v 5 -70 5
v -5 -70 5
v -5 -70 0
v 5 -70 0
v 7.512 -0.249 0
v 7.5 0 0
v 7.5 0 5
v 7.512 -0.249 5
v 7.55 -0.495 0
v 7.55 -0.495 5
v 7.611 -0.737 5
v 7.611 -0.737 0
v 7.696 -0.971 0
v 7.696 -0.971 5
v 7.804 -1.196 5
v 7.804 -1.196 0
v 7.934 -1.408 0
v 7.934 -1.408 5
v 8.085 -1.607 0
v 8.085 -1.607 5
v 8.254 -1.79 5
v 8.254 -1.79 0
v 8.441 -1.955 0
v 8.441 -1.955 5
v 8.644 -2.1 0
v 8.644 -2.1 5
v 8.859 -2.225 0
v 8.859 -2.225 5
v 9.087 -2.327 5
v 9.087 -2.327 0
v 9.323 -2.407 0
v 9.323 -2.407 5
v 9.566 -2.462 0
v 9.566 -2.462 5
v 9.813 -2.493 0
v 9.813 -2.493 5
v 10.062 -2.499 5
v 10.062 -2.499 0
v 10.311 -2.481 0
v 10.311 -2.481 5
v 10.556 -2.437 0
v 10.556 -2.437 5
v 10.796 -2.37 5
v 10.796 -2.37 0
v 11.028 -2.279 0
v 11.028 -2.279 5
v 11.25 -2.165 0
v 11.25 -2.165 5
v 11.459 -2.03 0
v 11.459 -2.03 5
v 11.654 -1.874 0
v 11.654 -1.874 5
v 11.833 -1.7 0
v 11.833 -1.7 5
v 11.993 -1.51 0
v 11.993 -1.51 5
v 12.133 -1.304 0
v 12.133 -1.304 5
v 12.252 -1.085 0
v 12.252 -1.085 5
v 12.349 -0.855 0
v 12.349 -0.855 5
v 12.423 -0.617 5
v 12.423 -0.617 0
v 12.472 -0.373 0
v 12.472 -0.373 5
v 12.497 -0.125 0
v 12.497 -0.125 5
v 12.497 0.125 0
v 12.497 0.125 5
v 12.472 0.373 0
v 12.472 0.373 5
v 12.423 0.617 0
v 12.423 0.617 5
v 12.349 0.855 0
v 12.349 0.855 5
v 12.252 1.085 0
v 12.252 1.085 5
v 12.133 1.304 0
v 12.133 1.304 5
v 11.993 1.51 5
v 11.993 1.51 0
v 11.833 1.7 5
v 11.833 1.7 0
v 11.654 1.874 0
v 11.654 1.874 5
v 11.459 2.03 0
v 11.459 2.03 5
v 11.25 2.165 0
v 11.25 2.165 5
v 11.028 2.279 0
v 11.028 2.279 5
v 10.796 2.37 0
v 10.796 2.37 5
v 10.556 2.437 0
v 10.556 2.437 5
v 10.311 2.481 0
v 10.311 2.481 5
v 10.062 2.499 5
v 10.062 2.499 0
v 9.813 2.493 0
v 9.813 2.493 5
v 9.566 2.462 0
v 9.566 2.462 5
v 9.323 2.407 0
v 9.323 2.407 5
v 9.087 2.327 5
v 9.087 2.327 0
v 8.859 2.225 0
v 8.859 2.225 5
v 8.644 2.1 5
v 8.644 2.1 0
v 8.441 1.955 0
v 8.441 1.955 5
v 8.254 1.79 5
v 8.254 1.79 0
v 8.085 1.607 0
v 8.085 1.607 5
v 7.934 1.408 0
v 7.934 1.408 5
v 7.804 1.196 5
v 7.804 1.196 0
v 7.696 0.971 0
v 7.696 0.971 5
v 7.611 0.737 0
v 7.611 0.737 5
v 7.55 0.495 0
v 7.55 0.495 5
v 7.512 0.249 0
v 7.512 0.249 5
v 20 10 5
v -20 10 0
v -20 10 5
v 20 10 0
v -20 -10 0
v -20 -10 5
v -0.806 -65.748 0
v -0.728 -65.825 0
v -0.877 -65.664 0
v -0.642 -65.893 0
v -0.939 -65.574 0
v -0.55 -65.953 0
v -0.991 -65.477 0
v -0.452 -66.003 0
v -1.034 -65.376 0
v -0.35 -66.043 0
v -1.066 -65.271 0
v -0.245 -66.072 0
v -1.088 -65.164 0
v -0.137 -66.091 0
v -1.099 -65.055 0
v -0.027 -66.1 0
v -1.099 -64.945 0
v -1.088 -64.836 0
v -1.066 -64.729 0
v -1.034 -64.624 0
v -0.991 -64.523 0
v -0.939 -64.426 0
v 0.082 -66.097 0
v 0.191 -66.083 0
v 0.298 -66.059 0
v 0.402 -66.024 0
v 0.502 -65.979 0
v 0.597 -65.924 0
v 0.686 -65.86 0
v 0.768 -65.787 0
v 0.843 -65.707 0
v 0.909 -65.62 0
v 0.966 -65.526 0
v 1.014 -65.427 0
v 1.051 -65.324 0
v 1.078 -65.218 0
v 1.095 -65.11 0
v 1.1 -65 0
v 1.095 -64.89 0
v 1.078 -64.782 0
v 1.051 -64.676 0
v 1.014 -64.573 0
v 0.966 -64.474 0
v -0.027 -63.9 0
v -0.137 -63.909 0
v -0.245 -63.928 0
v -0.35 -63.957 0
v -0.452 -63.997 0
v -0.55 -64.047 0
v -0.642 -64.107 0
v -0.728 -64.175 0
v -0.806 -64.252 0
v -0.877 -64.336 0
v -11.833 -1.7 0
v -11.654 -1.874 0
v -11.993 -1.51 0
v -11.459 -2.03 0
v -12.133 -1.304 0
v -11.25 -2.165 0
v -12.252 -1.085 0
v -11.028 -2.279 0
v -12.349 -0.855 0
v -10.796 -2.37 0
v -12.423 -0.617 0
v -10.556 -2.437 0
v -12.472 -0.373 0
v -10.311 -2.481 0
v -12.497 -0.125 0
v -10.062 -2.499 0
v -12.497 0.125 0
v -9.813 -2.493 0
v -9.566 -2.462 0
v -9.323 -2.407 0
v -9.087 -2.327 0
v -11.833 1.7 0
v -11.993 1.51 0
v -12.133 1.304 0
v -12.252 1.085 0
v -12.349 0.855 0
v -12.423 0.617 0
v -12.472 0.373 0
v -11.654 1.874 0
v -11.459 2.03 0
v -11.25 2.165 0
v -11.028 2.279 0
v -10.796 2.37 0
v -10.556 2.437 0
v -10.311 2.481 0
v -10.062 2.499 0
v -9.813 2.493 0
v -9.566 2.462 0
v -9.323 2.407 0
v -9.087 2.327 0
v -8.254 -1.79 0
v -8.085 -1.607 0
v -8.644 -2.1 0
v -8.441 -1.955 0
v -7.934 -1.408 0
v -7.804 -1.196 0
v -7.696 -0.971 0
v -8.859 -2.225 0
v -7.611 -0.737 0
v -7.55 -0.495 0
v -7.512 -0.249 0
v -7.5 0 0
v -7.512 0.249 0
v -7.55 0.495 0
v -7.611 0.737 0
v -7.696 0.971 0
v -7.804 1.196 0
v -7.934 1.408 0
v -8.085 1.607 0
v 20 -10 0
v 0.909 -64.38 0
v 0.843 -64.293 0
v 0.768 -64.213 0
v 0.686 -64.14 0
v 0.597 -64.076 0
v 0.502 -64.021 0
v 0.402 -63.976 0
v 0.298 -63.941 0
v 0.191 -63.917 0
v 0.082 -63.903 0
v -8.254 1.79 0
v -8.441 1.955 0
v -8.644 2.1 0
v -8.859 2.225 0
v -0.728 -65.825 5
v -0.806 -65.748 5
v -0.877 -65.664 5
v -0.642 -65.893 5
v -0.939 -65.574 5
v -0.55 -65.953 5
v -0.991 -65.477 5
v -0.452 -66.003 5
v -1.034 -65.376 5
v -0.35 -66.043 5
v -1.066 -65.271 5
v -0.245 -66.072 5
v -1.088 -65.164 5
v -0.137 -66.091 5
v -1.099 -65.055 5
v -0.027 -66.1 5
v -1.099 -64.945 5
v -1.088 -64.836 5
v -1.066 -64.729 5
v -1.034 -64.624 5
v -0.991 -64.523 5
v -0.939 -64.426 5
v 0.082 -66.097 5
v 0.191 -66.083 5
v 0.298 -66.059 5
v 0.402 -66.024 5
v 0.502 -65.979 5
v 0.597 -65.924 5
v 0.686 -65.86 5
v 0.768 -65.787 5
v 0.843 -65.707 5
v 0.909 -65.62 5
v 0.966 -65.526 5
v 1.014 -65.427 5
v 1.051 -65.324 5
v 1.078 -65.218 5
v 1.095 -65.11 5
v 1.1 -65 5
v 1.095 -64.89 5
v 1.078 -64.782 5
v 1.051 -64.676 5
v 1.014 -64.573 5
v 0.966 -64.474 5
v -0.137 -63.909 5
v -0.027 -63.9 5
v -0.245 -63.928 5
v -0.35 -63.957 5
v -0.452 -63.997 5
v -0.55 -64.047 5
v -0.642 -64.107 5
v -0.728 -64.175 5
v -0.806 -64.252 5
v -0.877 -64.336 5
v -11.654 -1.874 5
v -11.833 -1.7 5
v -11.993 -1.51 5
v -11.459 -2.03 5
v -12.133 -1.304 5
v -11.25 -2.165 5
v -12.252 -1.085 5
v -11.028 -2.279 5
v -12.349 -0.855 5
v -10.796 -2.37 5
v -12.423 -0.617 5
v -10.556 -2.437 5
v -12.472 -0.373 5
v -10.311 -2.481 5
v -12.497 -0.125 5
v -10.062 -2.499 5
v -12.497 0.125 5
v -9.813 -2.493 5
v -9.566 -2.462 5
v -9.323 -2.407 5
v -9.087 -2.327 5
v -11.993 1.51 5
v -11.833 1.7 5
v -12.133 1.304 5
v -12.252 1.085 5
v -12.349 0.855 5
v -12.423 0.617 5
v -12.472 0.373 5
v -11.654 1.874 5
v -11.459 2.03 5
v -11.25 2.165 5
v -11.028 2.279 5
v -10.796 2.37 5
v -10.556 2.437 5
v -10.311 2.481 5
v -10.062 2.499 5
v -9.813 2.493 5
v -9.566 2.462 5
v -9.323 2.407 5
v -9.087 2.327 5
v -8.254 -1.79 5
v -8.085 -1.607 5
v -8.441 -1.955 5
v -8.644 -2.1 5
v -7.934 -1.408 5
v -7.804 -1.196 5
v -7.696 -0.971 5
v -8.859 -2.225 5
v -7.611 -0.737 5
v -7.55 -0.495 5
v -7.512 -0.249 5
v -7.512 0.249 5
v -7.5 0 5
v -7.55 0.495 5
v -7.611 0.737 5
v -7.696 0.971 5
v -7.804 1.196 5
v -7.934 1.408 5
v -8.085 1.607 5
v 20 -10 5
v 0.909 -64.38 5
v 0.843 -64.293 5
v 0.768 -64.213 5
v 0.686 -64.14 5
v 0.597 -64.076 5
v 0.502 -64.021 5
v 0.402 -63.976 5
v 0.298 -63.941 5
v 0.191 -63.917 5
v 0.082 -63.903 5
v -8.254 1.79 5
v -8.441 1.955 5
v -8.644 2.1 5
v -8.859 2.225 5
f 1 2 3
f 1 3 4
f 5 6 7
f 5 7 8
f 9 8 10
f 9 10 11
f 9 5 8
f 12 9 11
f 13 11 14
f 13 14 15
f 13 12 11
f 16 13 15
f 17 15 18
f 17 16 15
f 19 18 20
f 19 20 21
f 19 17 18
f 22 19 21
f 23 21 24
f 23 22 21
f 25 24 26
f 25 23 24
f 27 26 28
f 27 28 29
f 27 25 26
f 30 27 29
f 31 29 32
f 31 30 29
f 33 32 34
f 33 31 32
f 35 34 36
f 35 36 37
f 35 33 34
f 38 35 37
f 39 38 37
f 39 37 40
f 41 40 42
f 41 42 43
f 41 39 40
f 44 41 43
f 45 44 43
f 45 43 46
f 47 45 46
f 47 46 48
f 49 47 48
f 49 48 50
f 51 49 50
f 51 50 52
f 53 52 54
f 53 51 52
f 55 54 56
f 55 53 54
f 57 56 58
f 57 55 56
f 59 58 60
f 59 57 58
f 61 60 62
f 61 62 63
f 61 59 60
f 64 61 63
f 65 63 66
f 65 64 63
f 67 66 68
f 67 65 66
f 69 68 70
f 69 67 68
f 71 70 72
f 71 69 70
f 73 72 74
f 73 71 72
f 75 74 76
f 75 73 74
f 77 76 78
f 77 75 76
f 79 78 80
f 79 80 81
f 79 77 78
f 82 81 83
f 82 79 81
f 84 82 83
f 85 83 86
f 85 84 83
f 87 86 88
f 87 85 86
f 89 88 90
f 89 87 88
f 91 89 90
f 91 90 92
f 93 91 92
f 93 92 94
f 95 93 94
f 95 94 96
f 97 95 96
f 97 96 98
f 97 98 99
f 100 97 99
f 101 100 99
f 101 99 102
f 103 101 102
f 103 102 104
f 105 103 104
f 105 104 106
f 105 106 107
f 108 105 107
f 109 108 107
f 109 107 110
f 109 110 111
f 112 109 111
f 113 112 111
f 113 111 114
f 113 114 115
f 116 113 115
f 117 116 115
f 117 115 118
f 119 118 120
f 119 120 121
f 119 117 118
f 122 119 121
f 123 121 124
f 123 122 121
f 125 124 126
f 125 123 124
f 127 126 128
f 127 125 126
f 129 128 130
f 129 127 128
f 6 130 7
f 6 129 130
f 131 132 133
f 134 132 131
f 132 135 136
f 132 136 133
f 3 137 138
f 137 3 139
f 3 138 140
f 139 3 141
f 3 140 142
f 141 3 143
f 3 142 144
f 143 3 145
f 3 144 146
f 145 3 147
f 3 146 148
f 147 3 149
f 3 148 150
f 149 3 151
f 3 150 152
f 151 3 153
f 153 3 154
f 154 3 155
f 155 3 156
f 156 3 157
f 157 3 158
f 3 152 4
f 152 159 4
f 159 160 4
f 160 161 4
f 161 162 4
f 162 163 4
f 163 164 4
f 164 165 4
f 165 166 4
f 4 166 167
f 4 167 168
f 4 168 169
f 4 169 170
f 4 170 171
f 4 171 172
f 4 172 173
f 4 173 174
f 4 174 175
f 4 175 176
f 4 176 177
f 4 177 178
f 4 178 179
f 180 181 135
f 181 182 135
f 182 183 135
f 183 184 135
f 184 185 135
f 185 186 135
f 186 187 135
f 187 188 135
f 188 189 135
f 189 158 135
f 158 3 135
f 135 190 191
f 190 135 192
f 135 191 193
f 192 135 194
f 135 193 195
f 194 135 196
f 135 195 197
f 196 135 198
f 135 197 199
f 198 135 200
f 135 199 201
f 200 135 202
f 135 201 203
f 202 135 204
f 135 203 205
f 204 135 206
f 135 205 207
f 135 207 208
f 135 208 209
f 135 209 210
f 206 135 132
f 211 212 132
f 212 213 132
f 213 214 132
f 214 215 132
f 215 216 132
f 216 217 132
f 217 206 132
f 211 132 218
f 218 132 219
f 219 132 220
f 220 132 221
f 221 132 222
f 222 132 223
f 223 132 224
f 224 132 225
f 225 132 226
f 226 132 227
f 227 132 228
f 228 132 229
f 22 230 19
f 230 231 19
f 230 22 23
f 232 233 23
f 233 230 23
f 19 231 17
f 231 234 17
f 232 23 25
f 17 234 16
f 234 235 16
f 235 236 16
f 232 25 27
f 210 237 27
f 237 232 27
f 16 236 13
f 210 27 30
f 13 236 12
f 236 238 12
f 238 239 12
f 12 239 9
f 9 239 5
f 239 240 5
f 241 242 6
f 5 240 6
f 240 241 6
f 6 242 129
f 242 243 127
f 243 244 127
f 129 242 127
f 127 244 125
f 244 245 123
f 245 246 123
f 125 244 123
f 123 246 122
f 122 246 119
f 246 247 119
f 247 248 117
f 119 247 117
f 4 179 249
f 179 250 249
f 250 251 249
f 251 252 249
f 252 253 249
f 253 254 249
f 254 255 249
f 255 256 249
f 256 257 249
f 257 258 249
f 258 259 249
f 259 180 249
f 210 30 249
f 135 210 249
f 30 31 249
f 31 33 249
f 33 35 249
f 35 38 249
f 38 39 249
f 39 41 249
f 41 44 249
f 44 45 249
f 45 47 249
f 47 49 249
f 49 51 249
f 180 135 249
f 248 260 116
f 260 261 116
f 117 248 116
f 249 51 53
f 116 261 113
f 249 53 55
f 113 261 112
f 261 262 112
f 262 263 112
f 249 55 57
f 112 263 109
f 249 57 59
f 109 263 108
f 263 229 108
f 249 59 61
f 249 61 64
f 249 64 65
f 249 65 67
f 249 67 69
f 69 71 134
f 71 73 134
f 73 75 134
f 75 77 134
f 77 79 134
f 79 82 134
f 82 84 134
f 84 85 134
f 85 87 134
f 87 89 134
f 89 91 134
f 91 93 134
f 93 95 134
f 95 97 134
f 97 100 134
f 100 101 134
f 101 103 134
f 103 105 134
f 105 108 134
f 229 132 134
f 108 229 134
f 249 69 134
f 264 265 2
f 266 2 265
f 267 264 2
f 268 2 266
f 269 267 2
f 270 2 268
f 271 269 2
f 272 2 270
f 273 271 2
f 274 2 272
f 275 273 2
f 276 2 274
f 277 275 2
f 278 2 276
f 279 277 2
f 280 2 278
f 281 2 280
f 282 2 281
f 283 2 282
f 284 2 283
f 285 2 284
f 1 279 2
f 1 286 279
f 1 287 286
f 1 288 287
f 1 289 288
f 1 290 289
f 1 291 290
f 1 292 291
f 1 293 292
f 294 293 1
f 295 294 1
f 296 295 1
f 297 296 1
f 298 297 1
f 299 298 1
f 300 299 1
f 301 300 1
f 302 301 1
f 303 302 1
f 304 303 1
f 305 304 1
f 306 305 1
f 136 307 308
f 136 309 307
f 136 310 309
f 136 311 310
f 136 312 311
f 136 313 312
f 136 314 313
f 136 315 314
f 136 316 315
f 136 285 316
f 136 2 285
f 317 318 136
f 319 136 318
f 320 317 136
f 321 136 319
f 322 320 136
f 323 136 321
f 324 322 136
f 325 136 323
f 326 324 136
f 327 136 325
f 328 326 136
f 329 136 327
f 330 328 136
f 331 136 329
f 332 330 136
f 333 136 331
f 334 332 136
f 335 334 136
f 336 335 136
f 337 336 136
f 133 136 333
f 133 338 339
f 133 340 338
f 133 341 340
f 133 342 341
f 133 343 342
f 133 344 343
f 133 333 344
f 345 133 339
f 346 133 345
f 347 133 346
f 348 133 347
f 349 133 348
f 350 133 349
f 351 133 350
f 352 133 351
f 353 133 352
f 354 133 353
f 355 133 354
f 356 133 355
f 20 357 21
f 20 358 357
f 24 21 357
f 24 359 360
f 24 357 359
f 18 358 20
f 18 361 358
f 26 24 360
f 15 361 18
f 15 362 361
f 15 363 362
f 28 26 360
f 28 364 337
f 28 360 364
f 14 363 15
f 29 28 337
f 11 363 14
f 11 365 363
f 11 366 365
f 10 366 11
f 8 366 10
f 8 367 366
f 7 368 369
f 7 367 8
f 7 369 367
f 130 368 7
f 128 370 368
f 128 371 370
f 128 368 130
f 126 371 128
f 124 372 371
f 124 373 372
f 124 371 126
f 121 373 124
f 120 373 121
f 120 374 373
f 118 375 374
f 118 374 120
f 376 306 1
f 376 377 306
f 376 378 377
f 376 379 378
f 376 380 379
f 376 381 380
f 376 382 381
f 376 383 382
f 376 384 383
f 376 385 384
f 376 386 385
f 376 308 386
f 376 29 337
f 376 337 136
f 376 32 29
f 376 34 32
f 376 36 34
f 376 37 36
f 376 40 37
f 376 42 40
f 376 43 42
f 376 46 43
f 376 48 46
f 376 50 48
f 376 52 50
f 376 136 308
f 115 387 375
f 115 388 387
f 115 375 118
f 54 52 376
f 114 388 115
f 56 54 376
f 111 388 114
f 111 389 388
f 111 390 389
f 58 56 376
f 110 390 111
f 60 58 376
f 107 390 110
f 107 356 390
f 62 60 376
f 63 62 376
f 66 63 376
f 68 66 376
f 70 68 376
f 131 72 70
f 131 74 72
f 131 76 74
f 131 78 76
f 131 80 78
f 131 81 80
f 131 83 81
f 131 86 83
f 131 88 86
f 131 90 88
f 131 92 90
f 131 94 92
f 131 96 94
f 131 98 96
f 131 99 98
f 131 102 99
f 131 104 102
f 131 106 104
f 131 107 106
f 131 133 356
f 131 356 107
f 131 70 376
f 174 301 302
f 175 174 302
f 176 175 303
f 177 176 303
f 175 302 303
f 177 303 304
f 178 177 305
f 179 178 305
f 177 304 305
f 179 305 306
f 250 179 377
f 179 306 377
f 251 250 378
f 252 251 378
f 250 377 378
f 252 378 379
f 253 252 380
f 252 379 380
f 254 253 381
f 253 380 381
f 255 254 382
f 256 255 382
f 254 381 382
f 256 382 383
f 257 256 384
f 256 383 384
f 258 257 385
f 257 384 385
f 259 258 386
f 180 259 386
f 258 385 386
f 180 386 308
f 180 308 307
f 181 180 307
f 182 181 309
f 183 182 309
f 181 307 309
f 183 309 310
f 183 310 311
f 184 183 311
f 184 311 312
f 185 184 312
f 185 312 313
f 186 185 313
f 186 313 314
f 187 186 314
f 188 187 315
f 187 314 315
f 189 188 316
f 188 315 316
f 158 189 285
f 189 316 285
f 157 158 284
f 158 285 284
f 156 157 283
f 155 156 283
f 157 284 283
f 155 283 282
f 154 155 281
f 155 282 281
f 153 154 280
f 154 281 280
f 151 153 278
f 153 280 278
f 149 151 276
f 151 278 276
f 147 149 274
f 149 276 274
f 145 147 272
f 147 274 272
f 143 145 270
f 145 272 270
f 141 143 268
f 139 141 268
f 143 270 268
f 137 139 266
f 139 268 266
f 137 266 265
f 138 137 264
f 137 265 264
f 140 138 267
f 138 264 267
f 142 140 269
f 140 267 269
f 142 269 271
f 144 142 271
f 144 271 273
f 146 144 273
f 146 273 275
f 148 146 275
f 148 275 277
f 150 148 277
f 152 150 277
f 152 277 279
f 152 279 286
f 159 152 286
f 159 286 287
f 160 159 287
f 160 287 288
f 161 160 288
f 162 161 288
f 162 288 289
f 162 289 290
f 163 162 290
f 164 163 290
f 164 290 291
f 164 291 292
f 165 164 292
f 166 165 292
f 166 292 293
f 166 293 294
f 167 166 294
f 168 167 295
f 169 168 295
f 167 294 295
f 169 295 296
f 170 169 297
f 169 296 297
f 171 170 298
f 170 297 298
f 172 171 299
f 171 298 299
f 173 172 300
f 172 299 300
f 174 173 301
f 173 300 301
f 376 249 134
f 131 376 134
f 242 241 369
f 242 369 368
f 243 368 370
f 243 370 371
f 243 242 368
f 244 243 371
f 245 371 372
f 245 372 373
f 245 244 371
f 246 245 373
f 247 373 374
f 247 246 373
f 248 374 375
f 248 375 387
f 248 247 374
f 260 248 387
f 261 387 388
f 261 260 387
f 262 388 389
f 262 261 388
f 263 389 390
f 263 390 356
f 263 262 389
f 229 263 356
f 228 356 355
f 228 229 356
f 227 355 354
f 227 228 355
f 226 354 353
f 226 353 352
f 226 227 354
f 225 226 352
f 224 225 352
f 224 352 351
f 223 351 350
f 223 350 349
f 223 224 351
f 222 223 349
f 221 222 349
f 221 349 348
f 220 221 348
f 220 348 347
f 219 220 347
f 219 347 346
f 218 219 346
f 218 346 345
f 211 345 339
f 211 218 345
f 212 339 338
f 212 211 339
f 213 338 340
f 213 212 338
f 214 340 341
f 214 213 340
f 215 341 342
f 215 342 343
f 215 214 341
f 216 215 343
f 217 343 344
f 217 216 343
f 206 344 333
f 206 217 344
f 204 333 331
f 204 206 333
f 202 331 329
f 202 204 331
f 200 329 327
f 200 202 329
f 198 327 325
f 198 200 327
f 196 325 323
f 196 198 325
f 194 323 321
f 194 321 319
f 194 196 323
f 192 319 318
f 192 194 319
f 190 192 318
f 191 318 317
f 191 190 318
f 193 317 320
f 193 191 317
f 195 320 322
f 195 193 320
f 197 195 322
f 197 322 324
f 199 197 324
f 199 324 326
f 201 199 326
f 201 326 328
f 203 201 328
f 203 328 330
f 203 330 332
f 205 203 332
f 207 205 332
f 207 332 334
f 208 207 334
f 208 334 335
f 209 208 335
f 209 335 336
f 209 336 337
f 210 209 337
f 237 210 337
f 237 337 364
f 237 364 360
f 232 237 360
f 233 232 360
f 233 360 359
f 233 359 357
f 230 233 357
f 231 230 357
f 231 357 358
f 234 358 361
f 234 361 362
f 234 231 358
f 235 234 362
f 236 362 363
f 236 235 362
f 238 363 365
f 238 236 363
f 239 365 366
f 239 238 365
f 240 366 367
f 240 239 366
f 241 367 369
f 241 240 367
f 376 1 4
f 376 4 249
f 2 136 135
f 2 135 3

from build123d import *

# Parameters (mm, degrees)
CROQUIS1_W              = 40
CROQUIS1_H              = 20
CROQUIS1_R              = 2.5
SALIENTE_EXTRUIR1_DEPTH = 5
CROQUIS2_W              = 10
CROQUIS2_H              = 10
CROQUIS2_R              = 1.1
SALIENTE_EXTRUIR2_DEPTH = 5


with BuildPart() as part:
    # Croquis1 → Saliente-Extruir1 (new body)
    with BuildSketch(Plane.XY):
        Rectangle(CROQUIS1_W, CROQUIS1_H)
        with Locations((-10, 0)):
            Circle(CROQUIS1_R, mode=Mode.SUBTRACT)
        with Locations(Location((10, 0, 0), (0, 0, 180))):
            Circle(CROQUIS1_R, mode=Mode.SUBTRACT)
    extrude(amount=SALIENTE_EXTRUIR1_DEPTH)

    # Croquis2 → Saliente-Extruir2 (add)
    # profile 1 of 2: a face of its own
    with BuildSketch(Plane.XY.offset(5)):
        Polygon((5, -60), (5, -70), (20, -10), (-20, -10), (-5, -70), (-5, -60), align=None)
    # profile 2 of 2: a face of its own
    with BuildSketch(Plane.XY.offset(5)):
        with Locations((0, -65)):
            Rectangle(CROQUIS2_W, CROQUIS2_H)
        with Locations((0, -65)):
            Circle(CROQUIS2_R, mode=Mode.SUBTRACT)
    extrude(amount=-SALIENTE_EXTRUIR2_DEPTH)


solid = part.part
